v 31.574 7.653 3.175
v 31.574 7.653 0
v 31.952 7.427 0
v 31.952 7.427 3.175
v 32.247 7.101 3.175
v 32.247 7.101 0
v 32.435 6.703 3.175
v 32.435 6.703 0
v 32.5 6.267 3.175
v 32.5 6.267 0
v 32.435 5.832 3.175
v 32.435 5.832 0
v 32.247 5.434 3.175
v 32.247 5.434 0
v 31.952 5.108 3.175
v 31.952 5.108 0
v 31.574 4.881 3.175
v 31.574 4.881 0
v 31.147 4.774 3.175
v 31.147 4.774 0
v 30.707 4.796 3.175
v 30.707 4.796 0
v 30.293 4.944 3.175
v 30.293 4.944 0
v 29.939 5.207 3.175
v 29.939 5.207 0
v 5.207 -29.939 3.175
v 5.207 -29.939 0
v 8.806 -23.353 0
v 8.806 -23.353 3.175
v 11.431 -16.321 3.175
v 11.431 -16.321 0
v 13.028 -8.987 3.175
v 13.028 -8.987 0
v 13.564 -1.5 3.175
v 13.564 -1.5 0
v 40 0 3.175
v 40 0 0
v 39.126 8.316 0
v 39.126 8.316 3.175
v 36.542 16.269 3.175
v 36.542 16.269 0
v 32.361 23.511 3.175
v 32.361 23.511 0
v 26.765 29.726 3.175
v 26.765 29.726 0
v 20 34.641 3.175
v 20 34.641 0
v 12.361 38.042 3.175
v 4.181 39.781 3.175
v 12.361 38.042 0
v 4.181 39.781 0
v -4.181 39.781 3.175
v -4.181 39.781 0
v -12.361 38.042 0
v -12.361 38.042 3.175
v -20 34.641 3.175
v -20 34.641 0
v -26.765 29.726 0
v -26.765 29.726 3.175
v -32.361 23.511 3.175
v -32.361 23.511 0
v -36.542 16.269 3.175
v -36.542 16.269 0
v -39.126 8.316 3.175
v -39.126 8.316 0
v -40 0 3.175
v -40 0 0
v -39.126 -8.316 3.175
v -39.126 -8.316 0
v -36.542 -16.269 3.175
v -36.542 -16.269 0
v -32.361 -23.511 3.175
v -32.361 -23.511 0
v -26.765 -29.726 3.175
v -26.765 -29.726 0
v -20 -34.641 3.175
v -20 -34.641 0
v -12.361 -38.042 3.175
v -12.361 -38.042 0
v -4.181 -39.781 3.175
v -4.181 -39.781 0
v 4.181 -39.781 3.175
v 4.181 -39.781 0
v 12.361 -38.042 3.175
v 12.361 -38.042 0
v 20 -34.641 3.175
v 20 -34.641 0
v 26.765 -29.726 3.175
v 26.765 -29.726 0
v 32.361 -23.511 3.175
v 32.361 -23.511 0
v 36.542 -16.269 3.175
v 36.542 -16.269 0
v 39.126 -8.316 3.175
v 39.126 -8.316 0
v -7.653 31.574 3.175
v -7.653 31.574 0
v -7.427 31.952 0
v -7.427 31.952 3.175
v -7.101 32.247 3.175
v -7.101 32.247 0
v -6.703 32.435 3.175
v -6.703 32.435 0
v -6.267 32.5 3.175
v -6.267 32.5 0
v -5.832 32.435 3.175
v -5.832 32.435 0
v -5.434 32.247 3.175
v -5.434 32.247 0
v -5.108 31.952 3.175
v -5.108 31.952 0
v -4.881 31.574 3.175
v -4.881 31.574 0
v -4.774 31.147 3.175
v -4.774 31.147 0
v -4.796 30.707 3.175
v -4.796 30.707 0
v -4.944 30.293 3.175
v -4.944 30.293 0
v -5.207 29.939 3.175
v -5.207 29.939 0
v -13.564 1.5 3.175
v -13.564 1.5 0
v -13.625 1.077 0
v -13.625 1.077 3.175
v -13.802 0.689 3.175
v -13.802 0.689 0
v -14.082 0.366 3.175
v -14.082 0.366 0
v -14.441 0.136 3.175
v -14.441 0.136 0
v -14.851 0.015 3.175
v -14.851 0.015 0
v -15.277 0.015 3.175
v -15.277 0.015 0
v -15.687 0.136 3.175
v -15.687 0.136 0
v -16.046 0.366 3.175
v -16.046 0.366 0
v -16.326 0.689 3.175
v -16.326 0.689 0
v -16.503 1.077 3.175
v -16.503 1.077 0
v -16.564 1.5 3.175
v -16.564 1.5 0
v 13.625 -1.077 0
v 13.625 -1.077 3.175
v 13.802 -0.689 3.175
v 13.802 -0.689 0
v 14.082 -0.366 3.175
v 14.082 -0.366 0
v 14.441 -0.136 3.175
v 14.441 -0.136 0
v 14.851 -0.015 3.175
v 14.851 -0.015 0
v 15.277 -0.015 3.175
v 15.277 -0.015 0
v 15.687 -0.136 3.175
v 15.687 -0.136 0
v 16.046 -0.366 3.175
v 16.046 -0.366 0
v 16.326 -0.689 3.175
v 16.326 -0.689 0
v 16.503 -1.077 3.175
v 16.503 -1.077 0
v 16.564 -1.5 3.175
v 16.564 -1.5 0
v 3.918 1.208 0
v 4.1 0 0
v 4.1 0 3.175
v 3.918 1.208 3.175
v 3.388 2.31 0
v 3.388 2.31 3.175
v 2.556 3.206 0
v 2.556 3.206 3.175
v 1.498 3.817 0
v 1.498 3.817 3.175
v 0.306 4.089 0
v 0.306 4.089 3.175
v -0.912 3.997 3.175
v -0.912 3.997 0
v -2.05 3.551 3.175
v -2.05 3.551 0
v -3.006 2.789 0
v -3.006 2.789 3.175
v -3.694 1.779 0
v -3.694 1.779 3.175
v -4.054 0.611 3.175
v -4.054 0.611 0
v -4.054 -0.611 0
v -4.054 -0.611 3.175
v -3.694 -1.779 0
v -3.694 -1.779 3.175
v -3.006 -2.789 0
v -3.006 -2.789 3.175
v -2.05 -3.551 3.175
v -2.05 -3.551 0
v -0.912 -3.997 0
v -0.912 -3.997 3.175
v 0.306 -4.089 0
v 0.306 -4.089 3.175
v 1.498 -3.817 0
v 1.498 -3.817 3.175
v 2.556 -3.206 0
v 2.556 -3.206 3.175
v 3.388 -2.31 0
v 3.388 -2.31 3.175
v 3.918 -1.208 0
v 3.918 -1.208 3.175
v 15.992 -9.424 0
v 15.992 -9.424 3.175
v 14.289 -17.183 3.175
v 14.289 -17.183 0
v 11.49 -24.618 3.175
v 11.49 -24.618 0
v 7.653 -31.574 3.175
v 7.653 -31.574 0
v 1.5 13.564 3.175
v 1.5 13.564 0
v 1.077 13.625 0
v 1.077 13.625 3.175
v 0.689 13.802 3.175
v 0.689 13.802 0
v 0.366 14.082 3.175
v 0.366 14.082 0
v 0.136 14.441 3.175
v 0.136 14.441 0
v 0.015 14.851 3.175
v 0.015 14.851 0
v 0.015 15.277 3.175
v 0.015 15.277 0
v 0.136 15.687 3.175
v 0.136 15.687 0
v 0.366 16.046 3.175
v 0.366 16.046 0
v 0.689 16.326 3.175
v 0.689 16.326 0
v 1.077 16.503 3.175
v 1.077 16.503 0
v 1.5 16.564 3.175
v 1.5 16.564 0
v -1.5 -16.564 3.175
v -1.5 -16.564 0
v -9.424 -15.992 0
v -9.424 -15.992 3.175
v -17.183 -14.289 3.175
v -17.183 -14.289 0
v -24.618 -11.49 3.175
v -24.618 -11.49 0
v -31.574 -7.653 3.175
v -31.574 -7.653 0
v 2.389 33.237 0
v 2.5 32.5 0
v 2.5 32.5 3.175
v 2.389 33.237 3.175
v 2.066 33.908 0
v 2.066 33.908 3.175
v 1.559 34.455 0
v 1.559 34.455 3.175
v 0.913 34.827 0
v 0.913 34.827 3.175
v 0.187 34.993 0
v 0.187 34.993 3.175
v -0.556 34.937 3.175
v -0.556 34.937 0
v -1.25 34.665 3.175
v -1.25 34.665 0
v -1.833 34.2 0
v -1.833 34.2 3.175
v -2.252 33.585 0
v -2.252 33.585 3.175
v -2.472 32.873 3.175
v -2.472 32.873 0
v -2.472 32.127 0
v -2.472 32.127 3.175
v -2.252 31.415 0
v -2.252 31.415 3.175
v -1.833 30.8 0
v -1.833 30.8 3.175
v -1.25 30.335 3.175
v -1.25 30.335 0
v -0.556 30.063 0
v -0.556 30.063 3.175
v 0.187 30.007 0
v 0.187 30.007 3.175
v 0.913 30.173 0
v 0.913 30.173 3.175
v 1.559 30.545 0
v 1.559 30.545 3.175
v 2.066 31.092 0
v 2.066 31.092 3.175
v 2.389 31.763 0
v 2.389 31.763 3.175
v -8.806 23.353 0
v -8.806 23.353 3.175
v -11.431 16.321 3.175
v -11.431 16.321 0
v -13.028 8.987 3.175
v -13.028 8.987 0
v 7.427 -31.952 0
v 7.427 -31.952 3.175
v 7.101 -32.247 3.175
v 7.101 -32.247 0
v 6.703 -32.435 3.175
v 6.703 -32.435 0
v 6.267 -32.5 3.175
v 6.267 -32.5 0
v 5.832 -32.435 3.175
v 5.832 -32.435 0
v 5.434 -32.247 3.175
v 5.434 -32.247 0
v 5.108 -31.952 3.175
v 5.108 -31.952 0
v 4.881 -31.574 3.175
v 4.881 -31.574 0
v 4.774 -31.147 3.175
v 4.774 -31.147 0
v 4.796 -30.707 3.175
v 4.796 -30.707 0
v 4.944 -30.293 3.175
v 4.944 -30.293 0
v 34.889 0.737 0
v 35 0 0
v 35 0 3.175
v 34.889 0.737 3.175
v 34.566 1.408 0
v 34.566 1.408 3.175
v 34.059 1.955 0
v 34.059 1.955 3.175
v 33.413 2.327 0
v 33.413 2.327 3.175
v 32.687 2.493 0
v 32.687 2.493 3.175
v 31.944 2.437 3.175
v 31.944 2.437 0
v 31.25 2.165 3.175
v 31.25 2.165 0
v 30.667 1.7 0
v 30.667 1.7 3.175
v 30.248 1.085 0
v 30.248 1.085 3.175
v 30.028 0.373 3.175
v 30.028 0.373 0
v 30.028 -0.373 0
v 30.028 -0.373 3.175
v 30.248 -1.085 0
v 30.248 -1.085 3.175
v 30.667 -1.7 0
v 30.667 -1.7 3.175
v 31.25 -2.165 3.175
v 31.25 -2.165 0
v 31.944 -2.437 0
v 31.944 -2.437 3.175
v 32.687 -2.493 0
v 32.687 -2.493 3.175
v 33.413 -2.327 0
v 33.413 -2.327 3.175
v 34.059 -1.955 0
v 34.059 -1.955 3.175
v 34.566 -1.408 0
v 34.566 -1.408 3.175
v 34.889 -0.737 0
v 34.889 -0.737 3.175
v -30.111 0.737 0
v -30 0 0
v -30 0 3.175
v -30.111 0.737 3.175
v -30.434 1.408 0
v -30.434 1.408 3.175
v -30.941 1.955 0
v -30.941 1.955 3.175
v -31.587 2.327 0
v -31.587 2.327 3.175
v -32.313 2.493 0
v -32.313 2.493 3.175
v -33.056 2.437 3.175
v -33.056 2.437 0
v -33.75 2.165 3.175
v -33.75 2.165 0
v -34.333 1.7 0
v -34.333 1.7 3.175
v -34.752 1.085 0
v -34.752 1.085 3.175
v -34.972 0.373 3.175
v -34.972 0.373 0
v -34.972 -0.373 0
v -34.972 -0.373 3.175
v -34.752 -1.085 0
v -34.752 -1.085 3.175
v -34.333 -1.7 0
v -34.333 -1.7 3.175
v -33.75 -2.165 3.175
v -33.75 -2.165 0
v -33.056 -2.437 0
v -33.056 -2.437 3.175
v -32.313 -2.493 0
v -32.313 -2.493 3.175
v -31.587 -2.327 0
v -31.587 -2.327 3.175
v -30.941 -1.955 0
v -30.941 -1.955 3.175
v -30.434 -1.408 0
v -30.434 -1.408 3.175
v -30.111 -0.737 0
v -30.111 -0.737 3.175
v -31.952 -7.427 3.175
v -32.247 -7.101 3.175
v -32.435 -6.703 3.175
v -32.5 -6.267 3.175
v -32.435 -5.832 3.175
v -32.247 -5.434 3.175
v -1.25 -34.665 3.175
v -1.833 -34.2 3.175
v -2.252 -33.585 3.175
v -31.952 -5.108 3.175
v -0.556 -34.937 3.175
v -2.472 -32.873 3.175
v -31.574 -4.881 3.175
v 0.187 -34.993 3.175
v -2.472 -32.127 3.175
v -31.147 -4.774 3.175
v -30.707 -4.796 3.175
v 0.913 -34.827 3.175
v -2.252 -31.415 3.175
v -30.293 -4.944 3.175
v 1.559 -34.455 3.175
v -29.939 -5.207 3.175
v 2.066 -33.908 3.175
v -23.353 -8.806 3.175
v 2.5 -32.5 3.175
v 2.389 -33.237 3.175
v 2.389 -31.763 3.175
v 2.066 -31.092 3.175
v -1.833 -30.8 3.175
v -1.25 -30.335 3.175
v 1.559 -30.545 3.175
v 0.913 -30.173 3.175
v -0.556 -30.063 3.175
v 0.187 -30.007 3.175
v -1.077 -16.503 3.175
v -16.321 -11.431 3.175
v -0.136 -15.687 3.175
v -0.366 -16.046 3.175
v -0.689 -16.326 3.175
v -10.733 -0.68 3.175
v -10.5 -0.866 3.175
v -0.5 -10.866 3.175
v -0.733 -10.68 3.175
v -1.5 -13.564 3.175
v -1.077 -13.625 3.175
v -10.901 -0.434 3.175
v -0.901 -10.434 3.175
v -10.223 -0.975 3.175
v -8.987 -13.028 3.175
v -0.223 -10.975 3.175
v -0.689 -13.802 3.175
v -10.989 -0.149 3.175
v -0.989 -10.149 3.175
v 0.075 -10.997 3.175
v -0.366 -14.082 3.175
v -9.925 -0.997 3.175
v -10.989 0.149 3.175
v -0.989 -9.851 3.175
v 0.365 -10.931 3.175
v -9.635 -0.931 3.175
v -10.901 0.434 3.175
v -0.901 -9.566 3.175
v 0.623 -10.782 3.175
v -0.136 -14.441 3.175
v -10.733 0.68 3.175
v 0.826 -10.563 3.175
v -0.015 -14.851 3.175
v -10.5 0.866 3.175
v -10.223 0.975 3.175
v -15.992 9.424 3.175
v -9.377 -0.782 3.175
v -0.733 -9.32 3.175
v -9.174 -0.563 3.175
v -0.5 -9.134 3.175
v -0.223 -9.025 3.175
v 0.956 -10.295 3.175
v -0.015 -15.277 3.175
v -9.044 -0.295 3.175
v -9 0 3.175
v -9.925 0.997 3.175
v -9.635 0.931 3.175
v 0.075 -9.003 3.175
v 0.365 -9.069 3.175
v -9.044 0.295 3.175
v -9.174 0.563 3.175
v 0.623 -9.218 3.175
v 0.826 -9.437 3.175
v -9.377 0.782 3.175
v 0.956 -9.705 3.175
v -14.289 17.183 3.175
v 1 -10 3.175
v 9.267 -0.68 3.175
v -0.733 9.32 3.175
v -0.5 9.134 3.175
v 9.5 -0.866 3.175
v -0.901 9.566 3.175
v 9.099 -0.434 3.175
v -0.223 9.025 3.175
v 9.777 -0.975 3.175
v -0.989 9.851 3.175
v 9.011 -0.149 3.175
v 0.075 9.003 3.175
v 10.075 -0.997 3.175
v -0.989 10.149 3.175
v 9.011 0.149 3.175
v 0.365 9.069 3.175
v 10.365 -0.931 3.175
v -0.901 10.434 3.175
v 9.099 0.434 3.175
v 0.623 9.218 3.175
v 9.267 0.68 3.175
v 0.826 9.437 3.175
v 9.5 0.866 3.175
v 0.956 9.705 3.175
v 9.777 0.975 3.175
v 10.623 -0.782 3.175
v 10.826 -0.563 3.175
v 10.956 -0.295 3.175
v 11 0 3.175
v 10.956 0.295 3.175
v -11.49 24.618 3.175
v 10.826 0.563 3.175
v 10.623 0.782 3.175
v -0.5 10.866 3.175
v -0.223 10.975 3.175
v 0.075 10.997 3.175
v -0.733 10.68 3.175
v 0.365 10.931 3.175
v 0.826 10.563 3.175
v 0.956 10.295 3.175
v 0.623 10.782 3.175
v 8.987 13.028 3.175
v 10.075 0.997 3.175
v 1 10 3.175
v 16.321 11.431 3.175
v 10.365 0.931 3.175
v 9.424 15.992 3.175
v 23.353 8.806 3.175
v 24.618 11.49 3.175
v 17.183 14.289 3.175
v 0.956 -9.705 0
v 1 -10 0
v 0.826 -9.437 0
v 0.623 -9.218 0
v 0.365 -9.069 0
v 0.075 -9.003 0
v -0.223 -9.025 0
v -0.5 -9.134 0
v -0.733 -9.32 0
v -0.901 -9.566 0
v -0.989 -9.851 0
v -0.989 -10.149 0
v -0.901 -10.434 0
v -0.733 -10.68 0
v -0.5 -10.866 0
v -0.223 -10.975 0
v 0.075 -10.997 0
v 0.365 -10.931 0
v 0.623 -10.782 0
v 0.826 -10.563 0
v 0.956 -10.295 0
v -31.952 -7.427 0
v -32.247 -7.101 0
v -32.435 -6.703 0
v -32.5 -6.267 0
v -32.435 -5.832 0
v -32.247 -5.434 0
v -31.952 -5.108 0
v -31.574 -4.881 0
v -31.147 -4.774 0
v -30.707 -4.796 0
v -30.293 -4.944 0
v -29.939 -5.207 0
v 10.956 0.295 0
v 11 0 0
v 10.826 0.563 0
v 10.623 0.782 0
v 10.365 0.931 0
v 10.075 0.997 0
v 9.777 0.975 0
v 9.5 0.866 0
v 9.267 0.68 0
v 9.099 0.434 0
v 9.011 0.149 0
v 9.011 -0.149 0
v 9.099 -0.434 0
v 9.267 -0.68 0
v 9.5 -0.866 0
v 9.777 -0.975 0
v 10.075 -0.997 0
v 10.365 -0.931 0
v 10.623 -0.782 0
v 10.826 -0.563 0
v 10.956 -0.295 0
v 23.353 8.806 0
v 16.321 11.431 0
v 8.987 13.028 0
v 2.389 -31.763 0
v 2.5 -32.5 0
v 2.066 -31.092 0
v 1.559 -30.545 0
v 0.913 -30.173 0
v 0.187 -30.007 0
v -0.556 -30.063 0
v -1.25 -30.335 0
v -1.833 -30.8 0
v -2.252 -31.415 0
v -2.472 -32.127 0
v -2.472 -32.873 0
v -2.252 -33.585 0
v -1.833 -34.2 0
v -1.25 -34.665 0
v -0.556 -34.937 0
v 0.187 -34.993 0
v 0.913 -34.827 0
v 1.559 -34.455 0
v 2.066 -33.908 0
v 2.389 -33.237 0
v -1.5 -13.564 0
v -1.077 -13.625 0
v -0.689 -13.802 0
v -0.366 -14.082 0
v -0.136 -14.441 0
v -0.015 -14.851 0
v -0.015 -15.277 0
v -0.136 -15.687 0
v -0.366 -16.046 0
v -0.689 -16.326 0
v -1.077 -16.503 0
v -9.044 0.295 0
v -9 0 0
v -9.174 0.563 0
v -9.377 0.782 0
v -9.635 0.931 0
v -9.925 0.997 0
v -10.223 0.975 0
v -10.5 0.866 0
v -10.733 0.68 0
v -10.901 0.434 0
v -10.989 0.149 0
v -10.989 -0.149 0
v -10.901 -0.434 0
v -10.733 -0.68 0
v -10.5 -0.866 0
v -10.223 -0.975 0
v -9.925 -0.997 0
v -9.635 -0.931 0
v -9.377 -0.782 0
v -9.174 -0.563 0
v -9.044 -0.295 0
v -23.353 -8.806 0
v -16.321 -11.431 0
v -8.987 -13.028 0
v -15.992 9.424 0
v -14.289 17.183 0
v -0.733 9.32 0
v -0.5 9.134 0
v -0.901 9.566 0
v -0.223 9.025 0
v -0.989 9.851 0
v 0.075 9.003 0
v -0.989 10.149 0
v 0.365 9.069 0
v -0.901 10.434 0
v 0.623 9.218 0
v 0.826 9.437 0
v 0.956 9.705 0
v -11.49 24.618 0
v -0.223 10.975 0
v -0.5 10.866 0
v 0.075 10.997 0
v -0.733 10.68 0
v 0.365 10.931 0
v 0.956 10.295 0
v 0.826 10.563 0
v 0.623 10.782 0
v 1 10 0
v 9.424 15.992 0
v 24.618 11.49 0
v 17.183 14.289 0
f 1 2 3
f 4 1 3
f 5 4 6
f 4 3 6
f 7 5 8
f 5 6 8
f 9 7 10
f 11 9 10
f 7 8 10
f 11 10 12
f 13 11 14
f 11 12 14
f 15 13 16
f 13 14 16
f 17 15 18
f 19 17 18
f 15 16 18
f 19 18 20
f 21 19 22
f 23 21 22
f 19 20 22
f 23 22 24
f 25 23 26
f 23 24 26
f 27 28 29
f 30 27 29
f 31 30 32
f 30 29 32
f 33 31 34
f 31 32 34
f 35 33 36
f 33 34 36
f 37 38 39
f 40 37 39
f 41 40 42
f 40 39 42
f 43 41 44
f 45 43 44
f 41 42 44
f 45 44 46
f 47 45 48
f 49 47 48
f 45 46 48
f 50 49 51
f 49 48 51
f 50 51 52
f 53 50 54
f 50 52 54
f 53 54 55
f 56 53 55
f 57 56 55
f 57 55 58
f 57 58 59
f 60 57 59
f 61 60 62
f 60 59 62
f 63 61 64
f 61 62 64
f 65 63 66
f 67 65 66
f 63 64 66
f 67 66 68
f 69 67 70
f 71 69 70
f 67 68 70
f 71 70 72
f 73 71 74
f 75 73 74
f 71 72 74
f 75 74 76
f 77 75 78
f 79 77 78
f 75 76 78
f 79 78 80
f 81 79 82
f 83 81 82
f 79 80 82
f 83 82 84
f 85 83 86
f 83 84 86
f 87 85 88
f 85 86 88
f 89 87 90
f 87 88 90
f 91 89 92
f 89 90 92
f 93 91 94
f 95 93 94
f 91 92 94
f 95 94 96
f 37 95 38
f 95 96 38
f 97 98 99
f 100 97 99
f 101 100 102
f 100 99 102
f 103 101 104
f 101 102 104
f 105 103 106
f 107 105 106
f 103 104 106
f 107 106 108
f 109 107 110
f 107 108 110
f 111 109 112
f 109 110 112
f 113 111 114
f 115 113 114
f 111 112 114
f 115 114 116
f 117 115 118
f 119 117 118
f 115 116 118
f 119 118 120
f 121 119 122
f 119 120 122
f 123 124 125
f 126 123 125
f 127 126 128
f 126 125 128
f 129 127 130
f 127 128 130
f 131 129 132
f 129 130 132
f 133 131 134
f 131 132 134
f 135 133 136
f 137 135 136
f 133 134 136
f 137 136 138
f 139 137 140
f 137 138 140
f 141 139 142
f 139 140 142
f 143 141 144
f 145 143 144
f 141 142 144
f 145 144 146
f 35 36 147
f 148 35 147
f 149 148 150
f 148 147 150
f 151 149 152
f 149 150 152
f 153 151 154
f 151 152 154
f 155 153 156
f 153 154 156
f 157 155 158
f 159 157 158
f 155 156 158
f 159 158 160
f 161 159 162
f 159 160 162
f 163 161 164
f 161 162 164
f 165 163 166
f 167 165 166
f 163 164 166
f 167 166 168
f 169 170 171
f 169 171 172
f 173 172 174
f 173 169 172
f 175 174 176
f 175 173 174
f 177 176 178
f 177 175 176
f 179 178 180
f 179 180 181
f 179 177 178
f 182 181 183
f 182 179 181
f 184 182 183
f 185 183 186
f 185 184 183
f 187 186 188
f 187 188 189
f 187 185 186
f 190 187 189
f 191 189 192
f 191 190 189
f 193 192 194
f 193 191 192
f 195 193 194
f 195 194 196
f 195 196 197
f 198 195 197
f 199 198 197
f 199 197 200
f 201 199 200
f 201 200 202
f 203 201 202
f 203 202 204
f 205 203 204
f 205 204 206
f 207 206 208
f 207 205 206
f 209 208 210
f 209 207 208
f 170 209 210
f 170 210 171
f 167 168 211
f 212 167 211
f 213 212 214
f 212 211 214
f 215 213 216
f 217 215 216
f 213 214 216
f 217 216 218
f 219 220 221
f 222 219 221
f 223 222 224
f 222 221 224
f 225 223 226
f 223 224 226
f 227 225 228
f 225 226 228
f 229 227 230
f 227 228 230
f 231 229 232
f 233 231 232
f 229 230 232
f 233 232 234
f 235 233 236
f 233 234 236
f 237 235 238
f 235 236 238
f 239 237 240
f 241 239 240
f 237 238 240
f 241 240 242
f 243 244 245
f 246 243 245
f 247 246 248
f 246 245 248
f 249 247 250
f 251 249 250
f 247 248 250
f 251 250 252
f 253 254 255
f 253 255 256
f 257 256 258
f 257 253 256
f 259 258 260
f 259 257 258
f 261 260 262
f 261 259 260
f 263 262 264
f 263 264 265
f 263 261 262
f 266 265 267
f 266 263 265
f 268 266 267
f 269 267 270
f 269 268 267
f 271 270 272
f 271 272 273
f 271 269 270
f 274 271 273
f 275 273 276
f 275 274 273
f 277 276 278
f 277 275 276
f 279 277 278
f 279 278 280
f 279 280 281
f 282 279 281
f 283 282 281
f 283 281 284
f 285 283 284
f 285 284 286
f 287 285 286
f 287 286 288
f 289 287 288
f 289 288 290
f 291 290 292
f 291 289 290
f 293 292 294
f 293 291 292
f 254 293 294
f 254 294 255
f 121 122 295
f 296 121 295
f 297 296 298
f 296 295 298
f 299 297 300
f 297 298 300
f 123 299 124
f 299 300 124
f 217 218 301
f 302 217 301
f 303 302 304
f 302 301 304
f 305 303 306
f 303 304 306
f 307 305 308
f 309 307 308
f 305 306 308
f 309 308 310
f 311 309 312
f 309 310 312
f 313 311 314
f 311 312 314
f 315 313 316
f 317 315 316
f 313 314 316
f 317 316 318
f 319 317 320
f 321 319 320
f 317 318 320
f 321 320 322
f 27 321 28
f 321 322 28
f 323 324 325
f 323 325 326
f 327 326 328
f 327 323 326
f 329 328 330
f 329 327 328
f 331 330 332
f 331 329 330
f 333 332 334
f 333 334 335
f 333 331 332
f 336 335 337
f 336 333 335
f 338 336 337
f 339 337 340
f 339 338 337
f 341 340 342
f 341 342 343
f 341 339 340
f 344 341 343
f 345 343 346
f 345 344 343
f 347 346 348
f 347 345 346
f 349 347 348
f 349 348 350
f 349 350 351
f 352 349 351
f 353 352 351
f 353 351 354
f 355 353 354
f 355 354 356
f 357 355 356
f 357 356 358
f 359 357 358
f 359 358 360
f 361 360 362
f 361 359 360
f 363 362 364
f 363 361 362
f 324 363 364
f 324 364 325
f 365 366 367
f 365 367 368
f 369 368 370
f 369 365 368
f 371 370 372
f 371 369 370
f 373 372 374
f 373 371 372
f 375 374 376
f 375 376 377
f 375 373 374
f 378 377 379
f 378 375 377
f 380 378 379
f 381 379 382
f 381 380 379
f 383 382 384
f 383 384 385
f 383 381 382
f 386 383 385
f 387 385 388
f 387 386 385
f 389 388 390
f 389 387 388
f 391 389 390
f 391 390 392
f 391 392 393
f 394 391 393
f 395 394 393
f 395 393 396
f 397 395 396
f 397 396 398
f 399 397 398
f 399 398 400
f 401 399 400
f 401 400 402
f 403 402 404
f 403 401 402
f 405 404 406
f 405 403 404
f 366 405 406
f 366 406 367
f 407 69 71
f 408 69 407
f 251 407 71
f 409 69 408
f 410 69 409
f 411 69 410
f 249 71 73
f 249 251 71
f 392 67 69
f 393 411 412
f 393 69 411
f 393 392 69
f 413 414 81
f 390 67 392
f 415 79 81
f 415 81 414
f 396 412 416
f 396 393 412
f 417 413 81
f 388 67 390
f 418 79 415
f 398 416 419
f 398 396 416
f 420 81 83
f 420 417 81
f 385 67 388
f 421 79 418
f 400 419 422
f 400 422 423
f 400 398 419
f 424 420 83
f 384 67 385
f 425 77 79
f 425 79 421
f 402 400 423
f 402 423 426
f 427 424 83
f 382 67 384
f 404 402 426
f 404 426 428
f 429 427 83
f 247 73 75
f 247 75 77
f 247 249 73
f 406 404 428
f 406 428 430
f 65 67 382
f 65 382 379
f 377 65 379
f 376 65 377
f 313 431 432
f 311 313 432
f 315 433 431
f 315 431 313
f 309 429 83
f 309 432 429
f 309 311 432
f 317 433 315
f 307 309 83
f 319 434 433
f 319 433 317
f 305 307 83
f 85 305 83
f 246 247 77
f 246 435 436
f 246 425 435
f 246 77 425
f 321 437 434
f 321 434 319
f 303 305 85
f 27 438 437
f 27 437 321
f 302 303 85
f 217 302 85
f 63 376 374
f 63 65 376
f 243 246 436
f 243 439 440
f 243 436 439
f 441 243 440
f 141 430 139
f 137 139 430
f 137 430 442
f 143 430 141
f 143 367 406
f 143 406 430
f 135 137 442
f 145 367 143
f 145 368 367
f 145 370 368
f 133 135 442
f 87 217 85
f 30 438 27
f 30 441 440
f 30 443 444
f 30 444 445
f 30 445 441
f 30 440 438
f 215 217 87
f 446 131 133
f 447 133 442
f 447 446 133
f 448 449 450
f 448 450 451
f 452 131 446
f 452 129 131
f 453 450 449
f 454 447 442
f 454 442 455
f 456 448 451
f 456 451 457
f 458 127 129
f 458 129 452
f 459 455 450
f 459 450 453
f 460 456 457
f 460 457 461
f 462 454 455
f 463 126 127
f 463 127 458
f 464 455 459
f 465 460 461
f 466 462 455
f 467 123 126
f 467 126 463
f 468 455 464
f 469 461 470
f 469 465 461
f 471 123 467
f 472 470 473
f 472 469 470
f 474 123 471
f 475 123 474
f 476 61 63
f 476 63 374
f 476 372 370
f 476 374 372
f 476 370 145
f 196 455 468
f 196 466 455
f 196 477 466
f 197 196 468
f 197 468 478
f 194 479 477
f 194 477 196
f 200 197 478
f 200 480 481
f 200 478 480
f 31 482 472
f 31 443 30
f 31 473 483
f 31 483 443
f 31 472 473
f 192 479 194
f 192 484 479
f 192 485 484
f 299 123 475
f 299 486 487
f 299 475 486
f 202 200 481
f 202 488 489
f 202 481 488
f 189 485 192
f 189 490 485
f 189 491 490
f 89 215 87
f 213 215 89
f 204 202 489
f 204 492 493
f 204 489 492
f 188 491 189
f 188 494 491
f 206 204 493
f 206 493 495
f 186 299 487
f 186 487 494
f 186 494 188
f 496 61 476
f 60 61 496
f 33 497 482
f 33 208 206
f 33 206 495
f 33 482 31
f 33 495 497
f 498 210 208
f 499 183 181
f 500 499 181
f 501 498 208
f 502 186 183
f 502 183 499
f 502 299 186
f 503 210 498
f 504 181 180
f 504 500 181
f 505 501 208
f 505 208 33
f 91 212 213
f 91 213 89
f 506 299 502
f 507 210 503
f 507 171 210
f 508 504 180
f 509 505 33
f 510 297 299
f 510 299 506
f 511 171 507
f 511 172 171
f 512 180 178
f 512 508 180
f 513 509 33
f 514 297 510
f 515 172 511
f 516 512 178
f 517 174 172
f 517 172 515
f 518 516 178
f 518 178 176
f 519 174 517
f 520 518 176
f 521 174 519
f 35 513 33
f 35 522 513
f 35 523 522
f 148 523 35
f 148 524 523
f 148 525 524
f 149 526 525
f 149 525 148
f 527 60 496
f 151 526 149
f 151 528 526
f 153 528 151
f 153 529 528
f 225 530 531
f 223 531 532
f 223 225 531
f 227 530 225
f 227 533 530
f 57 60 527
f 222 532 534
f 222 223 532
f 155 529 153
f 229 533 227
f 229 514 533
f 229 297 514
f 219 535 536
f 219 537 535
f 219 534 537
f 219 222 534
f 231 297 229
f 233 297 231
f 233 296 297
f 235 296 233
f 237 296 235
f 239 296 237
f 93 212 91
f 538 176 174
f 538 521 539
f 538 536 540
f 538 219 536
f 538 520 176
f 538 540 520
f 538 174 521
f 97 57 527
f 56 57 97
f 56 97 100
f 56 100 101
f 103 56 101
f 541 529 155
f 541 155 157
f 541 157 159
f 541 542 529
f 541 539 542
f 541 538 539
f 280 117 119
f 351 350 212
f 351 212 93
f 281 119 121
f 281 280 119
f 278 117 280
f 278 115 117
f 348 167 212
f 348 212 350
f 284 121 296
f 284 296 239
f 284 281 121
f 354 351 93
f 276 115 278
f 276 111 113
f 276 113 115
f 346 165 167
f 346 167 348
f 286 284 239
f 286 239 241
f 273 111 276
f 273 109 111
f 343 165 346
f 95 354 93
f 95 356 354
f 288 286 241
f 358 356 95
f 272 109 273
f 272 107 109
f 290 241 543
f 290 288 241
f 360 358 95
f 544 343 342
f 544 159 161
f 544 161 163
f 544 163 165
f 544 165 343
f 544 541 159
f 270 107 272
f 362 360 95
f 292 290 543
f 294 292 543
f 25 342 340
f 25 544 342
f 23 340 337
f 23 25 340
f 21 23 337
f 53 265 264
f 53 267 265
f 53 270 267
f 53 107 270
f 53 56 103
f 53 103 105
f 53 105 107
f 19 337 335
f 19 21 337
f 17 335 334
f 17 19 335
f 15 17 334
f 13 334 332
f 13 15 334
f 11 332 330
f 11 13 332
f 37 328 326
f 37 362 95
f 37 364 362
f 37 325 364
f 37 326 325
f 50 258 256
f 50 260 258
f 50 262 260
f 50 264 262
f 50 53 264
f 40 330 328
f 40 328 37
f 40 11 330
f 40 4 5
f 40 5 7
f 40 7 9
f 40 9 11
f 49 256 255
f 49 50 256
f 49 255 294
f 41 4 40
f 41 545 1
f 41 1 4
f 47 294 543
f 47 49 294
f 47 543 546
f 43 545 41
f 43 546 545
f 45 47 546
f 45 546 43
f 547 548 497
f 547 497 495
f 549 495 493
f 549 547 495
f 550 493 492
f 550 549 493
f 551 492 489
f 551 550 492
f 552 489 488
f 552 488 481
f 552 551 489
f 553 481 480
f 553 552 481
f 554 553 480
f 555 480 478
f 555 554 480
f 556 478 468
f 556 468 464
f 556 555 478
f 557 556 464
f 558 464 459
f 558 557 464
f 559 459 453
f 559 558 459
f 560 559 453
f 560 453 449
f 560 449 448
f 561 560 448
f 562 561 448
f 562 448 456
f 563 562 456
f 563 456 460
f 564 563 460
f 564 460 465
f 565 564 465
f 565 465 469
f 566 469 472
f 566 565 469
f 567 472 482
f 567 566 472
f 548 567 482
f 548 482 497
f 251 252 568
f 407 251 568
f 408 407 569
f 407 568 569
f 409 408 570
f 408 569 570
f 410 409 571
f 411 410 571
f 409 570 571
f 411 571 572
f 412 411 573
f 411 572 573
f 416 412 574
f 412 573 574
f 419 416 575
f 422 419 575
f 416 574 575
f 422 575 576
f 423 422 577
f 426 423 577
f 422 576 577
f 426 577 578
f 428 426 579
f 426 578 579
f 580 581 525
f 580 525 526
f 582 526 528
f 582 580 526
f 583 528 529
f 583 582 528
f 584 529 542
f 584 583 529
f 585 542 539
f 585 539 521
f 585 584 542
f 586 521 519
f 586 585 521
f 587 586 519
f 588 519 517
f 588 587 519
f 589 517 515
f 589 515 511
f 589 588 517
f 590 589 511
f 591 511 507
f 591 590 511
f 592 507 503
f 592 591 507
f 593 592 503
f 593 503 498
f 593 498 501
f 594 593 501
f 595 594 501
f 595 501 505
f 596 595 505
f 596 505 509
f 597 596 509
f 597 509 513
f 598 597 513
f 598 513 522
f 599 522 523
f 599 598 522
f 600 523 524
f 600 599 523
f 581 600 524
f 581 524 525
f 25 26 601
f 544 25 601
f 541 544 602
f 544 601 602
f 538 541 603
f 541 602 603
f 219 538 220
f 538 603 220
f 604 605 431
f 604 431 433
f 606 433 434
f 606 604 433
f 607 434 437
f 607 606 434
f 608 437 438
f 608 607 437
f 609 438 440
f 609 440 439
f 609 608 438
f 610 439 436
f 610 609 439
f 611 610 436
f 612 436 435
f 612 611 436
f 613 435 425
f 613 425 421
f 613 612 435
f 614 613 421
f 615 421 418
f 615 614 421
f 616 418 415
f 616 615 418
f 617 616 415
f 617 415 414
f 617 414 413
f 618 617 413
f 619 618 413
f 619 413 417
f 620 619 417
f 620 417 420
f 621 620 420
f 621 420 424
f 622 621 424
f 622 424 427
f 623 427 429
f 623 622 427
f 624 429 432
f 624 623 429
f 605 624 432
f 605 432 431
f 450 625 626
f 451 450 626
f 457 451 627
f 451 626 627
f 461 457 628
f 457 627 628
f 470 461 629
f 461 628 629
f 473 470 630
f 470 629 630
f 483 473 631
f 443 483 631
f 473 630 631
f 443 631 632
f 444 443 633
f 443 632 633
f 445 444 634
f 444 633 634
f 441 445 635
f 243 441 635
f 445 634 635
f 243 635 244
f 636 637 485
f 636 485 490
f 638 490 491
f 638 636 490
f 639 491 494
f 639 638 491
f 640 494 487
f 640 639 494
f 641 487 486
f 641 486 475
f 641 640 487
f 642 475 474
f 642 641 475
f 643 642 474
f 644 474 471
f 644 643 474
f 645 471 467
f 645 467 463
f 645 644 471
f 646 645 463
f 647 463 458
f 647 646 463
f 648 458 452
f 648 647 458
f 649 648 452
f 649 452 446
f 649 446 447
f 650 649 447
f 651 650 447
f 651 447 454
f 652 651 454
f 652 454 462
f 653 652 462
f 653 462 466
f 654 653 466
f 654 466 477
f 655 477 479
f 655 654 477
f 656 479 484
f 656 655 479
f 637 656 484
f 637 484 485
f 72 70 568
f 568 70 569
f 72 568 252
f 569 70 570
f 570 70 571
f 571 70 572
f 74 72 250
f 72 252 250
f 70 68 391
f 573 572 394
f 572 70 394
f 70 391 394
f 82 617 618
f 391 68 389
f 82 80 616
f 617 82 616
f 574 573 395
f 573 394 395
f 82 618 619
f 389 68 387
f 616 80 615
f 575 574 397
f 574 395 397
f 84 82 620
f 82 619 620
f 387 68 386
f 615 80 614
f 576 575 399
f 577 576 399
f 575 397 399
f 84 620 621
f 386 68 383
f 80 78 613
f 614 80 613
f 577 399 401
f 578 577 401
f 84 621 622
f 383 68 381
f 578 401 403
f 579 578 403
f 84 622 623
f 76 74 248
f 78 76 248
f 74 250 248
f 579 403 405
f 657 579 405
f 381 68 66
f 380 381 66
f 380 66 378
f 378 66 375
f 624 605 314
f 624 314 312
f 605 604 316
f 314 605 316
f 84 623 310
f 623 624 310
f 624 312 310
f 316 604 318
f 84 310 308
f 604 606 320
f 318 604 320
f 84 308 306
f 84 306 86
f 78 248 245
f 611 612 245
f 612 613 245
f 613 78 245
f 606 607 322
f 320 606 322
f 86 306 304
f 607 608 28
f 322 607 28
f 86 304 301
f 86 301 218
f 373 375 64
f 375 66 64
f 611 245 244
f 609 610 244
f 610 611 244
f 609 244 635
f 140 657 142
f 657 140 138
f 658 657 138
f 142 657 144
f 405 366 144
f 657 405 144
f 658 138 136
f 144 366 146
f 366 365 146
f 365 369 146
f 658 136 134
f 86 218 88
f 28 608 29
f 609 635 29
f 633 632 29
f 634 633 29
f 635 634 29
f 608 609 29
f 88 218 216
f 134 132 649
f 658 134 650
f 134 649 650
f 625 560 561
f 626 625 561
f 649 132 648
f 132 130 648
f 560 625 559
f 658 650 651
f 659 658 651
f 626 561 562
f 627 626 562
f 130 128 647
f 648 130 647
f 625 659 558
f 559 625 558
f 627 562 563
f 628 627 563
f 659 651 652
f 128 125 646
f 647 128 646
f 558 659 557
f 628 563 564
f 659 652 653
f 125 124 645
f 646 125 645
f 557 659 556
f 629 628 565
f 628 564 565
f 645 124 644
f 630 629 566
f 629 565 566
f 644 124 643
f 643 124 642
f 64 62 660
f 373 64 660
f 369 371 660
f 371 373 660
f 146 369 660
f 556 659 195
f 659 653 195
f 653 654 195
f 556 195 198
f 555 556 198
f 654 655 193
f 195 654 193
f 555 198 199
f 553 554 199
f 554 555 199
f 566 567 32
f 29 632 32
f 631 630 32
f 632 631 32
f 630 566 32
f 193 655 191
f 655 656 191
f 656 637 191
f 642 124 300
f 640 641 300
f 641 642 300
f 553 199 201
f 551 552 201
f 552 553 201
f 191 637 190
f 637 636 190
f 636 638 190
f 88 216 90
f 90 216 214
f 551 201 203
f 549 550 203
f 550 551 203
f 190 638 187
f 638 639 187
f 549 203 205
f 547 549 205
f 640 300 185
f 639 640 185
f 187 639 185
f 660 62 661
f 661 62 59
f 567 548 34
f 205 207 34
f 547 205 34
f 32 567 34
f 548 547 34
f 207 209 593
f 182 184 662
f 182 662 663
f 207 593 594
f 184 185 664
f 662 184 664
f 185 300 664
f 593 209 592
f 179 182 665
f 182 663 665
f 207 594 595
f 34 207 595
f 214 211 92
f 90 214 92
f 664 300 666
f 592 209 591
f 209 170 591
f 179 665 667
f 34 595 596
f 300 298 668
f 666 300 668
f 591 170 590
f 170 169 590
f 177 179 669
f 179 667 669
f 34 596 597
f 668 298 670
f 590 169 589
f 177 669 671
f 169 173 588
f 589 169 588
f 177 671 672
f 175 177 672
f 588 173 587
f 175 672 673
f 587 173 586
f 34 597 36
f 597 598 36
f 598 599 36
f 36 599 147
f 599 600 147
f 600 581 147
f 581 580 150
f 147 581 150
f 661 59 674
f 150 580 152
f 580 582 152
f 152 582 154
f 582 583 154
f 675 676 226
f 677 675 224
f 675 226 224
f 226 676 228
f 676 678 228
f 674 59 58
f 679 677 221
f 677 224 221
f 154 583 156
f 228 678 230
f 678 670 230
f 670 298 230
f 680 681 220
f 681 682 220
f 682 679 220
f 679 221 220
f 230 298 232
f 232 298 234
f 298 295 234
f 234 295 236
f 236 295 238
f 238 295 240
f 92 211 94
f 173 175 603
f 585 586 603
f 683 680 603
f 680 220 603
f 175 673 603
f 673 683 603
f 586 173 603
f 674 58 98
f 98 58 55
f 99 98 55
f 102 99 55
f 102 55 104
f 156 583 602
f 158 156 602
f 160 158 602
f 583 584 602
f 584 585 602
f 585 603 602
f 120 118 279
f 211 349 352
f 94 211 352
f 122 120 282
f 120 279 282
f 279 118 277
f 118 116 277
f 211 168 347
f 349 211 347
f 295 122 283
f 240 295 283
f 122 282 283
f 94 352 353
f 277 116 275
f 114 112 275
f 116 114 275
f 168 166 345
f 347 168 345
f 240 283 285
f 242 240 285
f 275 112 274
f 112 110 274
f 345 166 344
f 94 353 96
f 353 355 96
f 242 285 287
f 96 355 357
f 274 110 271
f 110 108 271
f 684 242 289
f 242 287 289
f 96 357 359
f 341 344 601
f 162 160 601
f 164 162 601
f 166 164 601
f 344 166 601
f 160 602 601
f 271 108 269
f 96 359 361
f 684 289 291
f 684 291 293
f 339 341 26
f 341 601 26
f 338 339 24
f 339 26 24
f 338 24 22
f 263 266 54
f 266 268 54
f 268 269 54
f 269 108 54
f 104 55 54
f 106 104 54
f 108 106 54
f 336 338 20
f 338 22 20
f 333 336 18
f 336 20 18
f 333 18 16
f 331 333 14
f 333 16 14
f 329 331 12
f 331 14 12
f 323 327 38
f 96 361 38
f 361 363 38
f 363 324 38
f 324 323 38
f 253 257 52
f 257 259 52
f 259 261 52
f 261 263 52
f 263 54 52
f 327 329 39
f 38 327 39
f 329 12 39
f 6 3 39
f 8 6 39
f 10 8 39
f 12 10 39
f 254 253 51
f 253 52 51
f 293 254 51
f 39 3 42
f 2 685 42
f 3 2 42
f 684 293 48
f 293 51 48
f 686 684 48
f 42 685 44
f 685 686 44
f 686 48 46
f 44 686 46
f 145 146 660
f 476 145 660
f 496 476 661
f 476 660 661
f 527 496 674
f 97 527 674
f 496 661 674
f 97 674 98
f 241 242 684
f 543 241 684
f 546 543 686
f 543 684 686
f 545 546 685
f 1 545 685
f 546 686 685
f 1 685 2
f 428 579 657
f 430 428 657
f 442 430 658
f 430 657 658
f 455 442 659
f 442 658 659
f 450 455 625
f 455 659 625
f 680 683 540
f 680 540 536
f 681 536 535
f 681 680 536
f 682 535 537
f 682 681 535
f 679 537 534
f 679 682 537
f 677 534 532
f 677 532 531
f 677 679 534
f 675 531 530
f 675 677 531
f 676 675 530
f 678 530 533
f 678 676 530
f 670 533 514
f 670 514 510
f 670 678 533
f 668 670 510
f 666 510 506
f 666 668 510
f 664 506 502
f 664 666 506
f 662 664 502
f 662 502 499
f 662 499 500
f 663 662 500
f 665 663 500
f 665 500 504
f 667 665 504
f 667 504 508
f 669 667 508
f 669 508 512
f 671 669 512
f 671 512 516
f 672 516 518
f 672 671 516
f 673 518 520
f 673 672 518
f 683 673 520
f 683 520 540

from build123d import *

# Parameters (mm, degrees)
SKETCH1_R           = 40
SKETCH1_R_2         = 4.1
SKETCH1_R_3         = 1
SKETCH1_R_4         = 2.5
BOSS_EXTRUDE1_DEPTH = 3.175


with BuildPart() as part:
    # Sketch1 → Boss-Extrude1 (new body)
    with BuildSketch(Plane.XY):
        Circle(SKETCH1_R)
        Circle(SKETCH1_R_2, mode=Mode.SUBTRACT)
        with Locations((10, 0)):
            Circle(SKETCH1_R_3, mode=Mode.SUBTRACT)
        with Locations((0, -10)):
            Circle(SKETCH1_R_3, mode=Mode.SUBTRACT)
        with Locations((-10, 0)):
            Circle(SKETCH1_R_3, mode=Mode.SUBTRACT)
        with Locations((0, 10)):
            Circle(SKETCH1_R_3, mode=Mode.SUBTRACT)
        with Locations((0, 32.500000024)):
            Circle(SKETCH1_R_4, mode=Mode.SUBTRACT)
        with Locations((32.500000024, 0)):
            Circle(SKETCH1_R_4, mode=Mode.SUBTRACT)
        with Locations((0, -32.500000024)):
            Circle(SKETCH1_R_4, mode=Mode.SUBTRACT)
        with Locations((-32.500000024, 0)):
            Circle(SKETCH1_R_4, mode=Mode.SUBTRACT)
        with BuildLine():
            ThreePointArc((1.5, 16.564017782), (17.18320836, 14.289419004), (31.574025173, 7.653063411))
            ThreePointArc((31.574025173, 7.653063411), (32.247204442, 5.433888763), (29.939339852, 5.206583941))
            ThreePointArc((29.939339852, 5.206583941), (16.320954352, 11.431399277), (1.5, 13.564017782))
            ThreePointArc((1.5, 13.564017782), (0, 15.064017782), (1.5, 16.564017782))
        make_face(mode=Mode.SUBTRACT)
        with BuildLine():
            ThreePointArc((16.564017782, -1.5), (14.289419004, -17.18320836), (7.653063411, -31.574025173))
            ThreePointArc((7.653063411, -31.574025173), (5.433888763, -32.247204442), (5.206583941, -29.939339852))
            ThreePointArc((5.206583941, -29.939339852), (11.431399277, -16.320954352), (13.564017782, -1.5))
            ThreePointArc((13.564017782, -1.5), (15.064017782, 0), (16.564017782, -1.5))
        make_face(mode=Mode.SUBTRACT)
        with BuildLine():
            ThreePointArc((-1.5, -16.564017782), (-17.18320836, -14.289419004), (-31.574025173, -7.653063411))
            ThreePointArc((-31.574025173, -7.653063411), (-32.247204442, -5.433888763), (-29.939339852, -5.206583941))
            ThreePointArc((-29.939339852, -5.206583941), (-16.320954352, -11.431399277), (-1.5, -13.564017782))
            ThreePointArc((-1.5, -13.564017782), (0, -15.064017782), (-1.5, -16.564017782))
        make_face(mode=Mode.SUBTRACT)
        with BuildLine():
            ThreePointArc((-16.564017782, 1.5), (-14.289419004, 17.18320836), (-7.653063411, 31.574025173))
            ThreePointArc((-7.653063411, 31.574025173), (-5.433888763, 32.247204442), (-5.206583941, 29.939339852))
            ThreePointArc((-5.206583941, 29.939339852), (-11.431399277, 16.320954352), (-13.564017782, 1.5))
            ThreePointArc((-13.564017782, 1.5), (-15.064017782, 0), (-16.564017782, 1.5))
        make_face(mode=Mode.SUBTRACT)
    extrude(amount=BOSS_EXTRUDE1_DEPTH)


solid = part.part
